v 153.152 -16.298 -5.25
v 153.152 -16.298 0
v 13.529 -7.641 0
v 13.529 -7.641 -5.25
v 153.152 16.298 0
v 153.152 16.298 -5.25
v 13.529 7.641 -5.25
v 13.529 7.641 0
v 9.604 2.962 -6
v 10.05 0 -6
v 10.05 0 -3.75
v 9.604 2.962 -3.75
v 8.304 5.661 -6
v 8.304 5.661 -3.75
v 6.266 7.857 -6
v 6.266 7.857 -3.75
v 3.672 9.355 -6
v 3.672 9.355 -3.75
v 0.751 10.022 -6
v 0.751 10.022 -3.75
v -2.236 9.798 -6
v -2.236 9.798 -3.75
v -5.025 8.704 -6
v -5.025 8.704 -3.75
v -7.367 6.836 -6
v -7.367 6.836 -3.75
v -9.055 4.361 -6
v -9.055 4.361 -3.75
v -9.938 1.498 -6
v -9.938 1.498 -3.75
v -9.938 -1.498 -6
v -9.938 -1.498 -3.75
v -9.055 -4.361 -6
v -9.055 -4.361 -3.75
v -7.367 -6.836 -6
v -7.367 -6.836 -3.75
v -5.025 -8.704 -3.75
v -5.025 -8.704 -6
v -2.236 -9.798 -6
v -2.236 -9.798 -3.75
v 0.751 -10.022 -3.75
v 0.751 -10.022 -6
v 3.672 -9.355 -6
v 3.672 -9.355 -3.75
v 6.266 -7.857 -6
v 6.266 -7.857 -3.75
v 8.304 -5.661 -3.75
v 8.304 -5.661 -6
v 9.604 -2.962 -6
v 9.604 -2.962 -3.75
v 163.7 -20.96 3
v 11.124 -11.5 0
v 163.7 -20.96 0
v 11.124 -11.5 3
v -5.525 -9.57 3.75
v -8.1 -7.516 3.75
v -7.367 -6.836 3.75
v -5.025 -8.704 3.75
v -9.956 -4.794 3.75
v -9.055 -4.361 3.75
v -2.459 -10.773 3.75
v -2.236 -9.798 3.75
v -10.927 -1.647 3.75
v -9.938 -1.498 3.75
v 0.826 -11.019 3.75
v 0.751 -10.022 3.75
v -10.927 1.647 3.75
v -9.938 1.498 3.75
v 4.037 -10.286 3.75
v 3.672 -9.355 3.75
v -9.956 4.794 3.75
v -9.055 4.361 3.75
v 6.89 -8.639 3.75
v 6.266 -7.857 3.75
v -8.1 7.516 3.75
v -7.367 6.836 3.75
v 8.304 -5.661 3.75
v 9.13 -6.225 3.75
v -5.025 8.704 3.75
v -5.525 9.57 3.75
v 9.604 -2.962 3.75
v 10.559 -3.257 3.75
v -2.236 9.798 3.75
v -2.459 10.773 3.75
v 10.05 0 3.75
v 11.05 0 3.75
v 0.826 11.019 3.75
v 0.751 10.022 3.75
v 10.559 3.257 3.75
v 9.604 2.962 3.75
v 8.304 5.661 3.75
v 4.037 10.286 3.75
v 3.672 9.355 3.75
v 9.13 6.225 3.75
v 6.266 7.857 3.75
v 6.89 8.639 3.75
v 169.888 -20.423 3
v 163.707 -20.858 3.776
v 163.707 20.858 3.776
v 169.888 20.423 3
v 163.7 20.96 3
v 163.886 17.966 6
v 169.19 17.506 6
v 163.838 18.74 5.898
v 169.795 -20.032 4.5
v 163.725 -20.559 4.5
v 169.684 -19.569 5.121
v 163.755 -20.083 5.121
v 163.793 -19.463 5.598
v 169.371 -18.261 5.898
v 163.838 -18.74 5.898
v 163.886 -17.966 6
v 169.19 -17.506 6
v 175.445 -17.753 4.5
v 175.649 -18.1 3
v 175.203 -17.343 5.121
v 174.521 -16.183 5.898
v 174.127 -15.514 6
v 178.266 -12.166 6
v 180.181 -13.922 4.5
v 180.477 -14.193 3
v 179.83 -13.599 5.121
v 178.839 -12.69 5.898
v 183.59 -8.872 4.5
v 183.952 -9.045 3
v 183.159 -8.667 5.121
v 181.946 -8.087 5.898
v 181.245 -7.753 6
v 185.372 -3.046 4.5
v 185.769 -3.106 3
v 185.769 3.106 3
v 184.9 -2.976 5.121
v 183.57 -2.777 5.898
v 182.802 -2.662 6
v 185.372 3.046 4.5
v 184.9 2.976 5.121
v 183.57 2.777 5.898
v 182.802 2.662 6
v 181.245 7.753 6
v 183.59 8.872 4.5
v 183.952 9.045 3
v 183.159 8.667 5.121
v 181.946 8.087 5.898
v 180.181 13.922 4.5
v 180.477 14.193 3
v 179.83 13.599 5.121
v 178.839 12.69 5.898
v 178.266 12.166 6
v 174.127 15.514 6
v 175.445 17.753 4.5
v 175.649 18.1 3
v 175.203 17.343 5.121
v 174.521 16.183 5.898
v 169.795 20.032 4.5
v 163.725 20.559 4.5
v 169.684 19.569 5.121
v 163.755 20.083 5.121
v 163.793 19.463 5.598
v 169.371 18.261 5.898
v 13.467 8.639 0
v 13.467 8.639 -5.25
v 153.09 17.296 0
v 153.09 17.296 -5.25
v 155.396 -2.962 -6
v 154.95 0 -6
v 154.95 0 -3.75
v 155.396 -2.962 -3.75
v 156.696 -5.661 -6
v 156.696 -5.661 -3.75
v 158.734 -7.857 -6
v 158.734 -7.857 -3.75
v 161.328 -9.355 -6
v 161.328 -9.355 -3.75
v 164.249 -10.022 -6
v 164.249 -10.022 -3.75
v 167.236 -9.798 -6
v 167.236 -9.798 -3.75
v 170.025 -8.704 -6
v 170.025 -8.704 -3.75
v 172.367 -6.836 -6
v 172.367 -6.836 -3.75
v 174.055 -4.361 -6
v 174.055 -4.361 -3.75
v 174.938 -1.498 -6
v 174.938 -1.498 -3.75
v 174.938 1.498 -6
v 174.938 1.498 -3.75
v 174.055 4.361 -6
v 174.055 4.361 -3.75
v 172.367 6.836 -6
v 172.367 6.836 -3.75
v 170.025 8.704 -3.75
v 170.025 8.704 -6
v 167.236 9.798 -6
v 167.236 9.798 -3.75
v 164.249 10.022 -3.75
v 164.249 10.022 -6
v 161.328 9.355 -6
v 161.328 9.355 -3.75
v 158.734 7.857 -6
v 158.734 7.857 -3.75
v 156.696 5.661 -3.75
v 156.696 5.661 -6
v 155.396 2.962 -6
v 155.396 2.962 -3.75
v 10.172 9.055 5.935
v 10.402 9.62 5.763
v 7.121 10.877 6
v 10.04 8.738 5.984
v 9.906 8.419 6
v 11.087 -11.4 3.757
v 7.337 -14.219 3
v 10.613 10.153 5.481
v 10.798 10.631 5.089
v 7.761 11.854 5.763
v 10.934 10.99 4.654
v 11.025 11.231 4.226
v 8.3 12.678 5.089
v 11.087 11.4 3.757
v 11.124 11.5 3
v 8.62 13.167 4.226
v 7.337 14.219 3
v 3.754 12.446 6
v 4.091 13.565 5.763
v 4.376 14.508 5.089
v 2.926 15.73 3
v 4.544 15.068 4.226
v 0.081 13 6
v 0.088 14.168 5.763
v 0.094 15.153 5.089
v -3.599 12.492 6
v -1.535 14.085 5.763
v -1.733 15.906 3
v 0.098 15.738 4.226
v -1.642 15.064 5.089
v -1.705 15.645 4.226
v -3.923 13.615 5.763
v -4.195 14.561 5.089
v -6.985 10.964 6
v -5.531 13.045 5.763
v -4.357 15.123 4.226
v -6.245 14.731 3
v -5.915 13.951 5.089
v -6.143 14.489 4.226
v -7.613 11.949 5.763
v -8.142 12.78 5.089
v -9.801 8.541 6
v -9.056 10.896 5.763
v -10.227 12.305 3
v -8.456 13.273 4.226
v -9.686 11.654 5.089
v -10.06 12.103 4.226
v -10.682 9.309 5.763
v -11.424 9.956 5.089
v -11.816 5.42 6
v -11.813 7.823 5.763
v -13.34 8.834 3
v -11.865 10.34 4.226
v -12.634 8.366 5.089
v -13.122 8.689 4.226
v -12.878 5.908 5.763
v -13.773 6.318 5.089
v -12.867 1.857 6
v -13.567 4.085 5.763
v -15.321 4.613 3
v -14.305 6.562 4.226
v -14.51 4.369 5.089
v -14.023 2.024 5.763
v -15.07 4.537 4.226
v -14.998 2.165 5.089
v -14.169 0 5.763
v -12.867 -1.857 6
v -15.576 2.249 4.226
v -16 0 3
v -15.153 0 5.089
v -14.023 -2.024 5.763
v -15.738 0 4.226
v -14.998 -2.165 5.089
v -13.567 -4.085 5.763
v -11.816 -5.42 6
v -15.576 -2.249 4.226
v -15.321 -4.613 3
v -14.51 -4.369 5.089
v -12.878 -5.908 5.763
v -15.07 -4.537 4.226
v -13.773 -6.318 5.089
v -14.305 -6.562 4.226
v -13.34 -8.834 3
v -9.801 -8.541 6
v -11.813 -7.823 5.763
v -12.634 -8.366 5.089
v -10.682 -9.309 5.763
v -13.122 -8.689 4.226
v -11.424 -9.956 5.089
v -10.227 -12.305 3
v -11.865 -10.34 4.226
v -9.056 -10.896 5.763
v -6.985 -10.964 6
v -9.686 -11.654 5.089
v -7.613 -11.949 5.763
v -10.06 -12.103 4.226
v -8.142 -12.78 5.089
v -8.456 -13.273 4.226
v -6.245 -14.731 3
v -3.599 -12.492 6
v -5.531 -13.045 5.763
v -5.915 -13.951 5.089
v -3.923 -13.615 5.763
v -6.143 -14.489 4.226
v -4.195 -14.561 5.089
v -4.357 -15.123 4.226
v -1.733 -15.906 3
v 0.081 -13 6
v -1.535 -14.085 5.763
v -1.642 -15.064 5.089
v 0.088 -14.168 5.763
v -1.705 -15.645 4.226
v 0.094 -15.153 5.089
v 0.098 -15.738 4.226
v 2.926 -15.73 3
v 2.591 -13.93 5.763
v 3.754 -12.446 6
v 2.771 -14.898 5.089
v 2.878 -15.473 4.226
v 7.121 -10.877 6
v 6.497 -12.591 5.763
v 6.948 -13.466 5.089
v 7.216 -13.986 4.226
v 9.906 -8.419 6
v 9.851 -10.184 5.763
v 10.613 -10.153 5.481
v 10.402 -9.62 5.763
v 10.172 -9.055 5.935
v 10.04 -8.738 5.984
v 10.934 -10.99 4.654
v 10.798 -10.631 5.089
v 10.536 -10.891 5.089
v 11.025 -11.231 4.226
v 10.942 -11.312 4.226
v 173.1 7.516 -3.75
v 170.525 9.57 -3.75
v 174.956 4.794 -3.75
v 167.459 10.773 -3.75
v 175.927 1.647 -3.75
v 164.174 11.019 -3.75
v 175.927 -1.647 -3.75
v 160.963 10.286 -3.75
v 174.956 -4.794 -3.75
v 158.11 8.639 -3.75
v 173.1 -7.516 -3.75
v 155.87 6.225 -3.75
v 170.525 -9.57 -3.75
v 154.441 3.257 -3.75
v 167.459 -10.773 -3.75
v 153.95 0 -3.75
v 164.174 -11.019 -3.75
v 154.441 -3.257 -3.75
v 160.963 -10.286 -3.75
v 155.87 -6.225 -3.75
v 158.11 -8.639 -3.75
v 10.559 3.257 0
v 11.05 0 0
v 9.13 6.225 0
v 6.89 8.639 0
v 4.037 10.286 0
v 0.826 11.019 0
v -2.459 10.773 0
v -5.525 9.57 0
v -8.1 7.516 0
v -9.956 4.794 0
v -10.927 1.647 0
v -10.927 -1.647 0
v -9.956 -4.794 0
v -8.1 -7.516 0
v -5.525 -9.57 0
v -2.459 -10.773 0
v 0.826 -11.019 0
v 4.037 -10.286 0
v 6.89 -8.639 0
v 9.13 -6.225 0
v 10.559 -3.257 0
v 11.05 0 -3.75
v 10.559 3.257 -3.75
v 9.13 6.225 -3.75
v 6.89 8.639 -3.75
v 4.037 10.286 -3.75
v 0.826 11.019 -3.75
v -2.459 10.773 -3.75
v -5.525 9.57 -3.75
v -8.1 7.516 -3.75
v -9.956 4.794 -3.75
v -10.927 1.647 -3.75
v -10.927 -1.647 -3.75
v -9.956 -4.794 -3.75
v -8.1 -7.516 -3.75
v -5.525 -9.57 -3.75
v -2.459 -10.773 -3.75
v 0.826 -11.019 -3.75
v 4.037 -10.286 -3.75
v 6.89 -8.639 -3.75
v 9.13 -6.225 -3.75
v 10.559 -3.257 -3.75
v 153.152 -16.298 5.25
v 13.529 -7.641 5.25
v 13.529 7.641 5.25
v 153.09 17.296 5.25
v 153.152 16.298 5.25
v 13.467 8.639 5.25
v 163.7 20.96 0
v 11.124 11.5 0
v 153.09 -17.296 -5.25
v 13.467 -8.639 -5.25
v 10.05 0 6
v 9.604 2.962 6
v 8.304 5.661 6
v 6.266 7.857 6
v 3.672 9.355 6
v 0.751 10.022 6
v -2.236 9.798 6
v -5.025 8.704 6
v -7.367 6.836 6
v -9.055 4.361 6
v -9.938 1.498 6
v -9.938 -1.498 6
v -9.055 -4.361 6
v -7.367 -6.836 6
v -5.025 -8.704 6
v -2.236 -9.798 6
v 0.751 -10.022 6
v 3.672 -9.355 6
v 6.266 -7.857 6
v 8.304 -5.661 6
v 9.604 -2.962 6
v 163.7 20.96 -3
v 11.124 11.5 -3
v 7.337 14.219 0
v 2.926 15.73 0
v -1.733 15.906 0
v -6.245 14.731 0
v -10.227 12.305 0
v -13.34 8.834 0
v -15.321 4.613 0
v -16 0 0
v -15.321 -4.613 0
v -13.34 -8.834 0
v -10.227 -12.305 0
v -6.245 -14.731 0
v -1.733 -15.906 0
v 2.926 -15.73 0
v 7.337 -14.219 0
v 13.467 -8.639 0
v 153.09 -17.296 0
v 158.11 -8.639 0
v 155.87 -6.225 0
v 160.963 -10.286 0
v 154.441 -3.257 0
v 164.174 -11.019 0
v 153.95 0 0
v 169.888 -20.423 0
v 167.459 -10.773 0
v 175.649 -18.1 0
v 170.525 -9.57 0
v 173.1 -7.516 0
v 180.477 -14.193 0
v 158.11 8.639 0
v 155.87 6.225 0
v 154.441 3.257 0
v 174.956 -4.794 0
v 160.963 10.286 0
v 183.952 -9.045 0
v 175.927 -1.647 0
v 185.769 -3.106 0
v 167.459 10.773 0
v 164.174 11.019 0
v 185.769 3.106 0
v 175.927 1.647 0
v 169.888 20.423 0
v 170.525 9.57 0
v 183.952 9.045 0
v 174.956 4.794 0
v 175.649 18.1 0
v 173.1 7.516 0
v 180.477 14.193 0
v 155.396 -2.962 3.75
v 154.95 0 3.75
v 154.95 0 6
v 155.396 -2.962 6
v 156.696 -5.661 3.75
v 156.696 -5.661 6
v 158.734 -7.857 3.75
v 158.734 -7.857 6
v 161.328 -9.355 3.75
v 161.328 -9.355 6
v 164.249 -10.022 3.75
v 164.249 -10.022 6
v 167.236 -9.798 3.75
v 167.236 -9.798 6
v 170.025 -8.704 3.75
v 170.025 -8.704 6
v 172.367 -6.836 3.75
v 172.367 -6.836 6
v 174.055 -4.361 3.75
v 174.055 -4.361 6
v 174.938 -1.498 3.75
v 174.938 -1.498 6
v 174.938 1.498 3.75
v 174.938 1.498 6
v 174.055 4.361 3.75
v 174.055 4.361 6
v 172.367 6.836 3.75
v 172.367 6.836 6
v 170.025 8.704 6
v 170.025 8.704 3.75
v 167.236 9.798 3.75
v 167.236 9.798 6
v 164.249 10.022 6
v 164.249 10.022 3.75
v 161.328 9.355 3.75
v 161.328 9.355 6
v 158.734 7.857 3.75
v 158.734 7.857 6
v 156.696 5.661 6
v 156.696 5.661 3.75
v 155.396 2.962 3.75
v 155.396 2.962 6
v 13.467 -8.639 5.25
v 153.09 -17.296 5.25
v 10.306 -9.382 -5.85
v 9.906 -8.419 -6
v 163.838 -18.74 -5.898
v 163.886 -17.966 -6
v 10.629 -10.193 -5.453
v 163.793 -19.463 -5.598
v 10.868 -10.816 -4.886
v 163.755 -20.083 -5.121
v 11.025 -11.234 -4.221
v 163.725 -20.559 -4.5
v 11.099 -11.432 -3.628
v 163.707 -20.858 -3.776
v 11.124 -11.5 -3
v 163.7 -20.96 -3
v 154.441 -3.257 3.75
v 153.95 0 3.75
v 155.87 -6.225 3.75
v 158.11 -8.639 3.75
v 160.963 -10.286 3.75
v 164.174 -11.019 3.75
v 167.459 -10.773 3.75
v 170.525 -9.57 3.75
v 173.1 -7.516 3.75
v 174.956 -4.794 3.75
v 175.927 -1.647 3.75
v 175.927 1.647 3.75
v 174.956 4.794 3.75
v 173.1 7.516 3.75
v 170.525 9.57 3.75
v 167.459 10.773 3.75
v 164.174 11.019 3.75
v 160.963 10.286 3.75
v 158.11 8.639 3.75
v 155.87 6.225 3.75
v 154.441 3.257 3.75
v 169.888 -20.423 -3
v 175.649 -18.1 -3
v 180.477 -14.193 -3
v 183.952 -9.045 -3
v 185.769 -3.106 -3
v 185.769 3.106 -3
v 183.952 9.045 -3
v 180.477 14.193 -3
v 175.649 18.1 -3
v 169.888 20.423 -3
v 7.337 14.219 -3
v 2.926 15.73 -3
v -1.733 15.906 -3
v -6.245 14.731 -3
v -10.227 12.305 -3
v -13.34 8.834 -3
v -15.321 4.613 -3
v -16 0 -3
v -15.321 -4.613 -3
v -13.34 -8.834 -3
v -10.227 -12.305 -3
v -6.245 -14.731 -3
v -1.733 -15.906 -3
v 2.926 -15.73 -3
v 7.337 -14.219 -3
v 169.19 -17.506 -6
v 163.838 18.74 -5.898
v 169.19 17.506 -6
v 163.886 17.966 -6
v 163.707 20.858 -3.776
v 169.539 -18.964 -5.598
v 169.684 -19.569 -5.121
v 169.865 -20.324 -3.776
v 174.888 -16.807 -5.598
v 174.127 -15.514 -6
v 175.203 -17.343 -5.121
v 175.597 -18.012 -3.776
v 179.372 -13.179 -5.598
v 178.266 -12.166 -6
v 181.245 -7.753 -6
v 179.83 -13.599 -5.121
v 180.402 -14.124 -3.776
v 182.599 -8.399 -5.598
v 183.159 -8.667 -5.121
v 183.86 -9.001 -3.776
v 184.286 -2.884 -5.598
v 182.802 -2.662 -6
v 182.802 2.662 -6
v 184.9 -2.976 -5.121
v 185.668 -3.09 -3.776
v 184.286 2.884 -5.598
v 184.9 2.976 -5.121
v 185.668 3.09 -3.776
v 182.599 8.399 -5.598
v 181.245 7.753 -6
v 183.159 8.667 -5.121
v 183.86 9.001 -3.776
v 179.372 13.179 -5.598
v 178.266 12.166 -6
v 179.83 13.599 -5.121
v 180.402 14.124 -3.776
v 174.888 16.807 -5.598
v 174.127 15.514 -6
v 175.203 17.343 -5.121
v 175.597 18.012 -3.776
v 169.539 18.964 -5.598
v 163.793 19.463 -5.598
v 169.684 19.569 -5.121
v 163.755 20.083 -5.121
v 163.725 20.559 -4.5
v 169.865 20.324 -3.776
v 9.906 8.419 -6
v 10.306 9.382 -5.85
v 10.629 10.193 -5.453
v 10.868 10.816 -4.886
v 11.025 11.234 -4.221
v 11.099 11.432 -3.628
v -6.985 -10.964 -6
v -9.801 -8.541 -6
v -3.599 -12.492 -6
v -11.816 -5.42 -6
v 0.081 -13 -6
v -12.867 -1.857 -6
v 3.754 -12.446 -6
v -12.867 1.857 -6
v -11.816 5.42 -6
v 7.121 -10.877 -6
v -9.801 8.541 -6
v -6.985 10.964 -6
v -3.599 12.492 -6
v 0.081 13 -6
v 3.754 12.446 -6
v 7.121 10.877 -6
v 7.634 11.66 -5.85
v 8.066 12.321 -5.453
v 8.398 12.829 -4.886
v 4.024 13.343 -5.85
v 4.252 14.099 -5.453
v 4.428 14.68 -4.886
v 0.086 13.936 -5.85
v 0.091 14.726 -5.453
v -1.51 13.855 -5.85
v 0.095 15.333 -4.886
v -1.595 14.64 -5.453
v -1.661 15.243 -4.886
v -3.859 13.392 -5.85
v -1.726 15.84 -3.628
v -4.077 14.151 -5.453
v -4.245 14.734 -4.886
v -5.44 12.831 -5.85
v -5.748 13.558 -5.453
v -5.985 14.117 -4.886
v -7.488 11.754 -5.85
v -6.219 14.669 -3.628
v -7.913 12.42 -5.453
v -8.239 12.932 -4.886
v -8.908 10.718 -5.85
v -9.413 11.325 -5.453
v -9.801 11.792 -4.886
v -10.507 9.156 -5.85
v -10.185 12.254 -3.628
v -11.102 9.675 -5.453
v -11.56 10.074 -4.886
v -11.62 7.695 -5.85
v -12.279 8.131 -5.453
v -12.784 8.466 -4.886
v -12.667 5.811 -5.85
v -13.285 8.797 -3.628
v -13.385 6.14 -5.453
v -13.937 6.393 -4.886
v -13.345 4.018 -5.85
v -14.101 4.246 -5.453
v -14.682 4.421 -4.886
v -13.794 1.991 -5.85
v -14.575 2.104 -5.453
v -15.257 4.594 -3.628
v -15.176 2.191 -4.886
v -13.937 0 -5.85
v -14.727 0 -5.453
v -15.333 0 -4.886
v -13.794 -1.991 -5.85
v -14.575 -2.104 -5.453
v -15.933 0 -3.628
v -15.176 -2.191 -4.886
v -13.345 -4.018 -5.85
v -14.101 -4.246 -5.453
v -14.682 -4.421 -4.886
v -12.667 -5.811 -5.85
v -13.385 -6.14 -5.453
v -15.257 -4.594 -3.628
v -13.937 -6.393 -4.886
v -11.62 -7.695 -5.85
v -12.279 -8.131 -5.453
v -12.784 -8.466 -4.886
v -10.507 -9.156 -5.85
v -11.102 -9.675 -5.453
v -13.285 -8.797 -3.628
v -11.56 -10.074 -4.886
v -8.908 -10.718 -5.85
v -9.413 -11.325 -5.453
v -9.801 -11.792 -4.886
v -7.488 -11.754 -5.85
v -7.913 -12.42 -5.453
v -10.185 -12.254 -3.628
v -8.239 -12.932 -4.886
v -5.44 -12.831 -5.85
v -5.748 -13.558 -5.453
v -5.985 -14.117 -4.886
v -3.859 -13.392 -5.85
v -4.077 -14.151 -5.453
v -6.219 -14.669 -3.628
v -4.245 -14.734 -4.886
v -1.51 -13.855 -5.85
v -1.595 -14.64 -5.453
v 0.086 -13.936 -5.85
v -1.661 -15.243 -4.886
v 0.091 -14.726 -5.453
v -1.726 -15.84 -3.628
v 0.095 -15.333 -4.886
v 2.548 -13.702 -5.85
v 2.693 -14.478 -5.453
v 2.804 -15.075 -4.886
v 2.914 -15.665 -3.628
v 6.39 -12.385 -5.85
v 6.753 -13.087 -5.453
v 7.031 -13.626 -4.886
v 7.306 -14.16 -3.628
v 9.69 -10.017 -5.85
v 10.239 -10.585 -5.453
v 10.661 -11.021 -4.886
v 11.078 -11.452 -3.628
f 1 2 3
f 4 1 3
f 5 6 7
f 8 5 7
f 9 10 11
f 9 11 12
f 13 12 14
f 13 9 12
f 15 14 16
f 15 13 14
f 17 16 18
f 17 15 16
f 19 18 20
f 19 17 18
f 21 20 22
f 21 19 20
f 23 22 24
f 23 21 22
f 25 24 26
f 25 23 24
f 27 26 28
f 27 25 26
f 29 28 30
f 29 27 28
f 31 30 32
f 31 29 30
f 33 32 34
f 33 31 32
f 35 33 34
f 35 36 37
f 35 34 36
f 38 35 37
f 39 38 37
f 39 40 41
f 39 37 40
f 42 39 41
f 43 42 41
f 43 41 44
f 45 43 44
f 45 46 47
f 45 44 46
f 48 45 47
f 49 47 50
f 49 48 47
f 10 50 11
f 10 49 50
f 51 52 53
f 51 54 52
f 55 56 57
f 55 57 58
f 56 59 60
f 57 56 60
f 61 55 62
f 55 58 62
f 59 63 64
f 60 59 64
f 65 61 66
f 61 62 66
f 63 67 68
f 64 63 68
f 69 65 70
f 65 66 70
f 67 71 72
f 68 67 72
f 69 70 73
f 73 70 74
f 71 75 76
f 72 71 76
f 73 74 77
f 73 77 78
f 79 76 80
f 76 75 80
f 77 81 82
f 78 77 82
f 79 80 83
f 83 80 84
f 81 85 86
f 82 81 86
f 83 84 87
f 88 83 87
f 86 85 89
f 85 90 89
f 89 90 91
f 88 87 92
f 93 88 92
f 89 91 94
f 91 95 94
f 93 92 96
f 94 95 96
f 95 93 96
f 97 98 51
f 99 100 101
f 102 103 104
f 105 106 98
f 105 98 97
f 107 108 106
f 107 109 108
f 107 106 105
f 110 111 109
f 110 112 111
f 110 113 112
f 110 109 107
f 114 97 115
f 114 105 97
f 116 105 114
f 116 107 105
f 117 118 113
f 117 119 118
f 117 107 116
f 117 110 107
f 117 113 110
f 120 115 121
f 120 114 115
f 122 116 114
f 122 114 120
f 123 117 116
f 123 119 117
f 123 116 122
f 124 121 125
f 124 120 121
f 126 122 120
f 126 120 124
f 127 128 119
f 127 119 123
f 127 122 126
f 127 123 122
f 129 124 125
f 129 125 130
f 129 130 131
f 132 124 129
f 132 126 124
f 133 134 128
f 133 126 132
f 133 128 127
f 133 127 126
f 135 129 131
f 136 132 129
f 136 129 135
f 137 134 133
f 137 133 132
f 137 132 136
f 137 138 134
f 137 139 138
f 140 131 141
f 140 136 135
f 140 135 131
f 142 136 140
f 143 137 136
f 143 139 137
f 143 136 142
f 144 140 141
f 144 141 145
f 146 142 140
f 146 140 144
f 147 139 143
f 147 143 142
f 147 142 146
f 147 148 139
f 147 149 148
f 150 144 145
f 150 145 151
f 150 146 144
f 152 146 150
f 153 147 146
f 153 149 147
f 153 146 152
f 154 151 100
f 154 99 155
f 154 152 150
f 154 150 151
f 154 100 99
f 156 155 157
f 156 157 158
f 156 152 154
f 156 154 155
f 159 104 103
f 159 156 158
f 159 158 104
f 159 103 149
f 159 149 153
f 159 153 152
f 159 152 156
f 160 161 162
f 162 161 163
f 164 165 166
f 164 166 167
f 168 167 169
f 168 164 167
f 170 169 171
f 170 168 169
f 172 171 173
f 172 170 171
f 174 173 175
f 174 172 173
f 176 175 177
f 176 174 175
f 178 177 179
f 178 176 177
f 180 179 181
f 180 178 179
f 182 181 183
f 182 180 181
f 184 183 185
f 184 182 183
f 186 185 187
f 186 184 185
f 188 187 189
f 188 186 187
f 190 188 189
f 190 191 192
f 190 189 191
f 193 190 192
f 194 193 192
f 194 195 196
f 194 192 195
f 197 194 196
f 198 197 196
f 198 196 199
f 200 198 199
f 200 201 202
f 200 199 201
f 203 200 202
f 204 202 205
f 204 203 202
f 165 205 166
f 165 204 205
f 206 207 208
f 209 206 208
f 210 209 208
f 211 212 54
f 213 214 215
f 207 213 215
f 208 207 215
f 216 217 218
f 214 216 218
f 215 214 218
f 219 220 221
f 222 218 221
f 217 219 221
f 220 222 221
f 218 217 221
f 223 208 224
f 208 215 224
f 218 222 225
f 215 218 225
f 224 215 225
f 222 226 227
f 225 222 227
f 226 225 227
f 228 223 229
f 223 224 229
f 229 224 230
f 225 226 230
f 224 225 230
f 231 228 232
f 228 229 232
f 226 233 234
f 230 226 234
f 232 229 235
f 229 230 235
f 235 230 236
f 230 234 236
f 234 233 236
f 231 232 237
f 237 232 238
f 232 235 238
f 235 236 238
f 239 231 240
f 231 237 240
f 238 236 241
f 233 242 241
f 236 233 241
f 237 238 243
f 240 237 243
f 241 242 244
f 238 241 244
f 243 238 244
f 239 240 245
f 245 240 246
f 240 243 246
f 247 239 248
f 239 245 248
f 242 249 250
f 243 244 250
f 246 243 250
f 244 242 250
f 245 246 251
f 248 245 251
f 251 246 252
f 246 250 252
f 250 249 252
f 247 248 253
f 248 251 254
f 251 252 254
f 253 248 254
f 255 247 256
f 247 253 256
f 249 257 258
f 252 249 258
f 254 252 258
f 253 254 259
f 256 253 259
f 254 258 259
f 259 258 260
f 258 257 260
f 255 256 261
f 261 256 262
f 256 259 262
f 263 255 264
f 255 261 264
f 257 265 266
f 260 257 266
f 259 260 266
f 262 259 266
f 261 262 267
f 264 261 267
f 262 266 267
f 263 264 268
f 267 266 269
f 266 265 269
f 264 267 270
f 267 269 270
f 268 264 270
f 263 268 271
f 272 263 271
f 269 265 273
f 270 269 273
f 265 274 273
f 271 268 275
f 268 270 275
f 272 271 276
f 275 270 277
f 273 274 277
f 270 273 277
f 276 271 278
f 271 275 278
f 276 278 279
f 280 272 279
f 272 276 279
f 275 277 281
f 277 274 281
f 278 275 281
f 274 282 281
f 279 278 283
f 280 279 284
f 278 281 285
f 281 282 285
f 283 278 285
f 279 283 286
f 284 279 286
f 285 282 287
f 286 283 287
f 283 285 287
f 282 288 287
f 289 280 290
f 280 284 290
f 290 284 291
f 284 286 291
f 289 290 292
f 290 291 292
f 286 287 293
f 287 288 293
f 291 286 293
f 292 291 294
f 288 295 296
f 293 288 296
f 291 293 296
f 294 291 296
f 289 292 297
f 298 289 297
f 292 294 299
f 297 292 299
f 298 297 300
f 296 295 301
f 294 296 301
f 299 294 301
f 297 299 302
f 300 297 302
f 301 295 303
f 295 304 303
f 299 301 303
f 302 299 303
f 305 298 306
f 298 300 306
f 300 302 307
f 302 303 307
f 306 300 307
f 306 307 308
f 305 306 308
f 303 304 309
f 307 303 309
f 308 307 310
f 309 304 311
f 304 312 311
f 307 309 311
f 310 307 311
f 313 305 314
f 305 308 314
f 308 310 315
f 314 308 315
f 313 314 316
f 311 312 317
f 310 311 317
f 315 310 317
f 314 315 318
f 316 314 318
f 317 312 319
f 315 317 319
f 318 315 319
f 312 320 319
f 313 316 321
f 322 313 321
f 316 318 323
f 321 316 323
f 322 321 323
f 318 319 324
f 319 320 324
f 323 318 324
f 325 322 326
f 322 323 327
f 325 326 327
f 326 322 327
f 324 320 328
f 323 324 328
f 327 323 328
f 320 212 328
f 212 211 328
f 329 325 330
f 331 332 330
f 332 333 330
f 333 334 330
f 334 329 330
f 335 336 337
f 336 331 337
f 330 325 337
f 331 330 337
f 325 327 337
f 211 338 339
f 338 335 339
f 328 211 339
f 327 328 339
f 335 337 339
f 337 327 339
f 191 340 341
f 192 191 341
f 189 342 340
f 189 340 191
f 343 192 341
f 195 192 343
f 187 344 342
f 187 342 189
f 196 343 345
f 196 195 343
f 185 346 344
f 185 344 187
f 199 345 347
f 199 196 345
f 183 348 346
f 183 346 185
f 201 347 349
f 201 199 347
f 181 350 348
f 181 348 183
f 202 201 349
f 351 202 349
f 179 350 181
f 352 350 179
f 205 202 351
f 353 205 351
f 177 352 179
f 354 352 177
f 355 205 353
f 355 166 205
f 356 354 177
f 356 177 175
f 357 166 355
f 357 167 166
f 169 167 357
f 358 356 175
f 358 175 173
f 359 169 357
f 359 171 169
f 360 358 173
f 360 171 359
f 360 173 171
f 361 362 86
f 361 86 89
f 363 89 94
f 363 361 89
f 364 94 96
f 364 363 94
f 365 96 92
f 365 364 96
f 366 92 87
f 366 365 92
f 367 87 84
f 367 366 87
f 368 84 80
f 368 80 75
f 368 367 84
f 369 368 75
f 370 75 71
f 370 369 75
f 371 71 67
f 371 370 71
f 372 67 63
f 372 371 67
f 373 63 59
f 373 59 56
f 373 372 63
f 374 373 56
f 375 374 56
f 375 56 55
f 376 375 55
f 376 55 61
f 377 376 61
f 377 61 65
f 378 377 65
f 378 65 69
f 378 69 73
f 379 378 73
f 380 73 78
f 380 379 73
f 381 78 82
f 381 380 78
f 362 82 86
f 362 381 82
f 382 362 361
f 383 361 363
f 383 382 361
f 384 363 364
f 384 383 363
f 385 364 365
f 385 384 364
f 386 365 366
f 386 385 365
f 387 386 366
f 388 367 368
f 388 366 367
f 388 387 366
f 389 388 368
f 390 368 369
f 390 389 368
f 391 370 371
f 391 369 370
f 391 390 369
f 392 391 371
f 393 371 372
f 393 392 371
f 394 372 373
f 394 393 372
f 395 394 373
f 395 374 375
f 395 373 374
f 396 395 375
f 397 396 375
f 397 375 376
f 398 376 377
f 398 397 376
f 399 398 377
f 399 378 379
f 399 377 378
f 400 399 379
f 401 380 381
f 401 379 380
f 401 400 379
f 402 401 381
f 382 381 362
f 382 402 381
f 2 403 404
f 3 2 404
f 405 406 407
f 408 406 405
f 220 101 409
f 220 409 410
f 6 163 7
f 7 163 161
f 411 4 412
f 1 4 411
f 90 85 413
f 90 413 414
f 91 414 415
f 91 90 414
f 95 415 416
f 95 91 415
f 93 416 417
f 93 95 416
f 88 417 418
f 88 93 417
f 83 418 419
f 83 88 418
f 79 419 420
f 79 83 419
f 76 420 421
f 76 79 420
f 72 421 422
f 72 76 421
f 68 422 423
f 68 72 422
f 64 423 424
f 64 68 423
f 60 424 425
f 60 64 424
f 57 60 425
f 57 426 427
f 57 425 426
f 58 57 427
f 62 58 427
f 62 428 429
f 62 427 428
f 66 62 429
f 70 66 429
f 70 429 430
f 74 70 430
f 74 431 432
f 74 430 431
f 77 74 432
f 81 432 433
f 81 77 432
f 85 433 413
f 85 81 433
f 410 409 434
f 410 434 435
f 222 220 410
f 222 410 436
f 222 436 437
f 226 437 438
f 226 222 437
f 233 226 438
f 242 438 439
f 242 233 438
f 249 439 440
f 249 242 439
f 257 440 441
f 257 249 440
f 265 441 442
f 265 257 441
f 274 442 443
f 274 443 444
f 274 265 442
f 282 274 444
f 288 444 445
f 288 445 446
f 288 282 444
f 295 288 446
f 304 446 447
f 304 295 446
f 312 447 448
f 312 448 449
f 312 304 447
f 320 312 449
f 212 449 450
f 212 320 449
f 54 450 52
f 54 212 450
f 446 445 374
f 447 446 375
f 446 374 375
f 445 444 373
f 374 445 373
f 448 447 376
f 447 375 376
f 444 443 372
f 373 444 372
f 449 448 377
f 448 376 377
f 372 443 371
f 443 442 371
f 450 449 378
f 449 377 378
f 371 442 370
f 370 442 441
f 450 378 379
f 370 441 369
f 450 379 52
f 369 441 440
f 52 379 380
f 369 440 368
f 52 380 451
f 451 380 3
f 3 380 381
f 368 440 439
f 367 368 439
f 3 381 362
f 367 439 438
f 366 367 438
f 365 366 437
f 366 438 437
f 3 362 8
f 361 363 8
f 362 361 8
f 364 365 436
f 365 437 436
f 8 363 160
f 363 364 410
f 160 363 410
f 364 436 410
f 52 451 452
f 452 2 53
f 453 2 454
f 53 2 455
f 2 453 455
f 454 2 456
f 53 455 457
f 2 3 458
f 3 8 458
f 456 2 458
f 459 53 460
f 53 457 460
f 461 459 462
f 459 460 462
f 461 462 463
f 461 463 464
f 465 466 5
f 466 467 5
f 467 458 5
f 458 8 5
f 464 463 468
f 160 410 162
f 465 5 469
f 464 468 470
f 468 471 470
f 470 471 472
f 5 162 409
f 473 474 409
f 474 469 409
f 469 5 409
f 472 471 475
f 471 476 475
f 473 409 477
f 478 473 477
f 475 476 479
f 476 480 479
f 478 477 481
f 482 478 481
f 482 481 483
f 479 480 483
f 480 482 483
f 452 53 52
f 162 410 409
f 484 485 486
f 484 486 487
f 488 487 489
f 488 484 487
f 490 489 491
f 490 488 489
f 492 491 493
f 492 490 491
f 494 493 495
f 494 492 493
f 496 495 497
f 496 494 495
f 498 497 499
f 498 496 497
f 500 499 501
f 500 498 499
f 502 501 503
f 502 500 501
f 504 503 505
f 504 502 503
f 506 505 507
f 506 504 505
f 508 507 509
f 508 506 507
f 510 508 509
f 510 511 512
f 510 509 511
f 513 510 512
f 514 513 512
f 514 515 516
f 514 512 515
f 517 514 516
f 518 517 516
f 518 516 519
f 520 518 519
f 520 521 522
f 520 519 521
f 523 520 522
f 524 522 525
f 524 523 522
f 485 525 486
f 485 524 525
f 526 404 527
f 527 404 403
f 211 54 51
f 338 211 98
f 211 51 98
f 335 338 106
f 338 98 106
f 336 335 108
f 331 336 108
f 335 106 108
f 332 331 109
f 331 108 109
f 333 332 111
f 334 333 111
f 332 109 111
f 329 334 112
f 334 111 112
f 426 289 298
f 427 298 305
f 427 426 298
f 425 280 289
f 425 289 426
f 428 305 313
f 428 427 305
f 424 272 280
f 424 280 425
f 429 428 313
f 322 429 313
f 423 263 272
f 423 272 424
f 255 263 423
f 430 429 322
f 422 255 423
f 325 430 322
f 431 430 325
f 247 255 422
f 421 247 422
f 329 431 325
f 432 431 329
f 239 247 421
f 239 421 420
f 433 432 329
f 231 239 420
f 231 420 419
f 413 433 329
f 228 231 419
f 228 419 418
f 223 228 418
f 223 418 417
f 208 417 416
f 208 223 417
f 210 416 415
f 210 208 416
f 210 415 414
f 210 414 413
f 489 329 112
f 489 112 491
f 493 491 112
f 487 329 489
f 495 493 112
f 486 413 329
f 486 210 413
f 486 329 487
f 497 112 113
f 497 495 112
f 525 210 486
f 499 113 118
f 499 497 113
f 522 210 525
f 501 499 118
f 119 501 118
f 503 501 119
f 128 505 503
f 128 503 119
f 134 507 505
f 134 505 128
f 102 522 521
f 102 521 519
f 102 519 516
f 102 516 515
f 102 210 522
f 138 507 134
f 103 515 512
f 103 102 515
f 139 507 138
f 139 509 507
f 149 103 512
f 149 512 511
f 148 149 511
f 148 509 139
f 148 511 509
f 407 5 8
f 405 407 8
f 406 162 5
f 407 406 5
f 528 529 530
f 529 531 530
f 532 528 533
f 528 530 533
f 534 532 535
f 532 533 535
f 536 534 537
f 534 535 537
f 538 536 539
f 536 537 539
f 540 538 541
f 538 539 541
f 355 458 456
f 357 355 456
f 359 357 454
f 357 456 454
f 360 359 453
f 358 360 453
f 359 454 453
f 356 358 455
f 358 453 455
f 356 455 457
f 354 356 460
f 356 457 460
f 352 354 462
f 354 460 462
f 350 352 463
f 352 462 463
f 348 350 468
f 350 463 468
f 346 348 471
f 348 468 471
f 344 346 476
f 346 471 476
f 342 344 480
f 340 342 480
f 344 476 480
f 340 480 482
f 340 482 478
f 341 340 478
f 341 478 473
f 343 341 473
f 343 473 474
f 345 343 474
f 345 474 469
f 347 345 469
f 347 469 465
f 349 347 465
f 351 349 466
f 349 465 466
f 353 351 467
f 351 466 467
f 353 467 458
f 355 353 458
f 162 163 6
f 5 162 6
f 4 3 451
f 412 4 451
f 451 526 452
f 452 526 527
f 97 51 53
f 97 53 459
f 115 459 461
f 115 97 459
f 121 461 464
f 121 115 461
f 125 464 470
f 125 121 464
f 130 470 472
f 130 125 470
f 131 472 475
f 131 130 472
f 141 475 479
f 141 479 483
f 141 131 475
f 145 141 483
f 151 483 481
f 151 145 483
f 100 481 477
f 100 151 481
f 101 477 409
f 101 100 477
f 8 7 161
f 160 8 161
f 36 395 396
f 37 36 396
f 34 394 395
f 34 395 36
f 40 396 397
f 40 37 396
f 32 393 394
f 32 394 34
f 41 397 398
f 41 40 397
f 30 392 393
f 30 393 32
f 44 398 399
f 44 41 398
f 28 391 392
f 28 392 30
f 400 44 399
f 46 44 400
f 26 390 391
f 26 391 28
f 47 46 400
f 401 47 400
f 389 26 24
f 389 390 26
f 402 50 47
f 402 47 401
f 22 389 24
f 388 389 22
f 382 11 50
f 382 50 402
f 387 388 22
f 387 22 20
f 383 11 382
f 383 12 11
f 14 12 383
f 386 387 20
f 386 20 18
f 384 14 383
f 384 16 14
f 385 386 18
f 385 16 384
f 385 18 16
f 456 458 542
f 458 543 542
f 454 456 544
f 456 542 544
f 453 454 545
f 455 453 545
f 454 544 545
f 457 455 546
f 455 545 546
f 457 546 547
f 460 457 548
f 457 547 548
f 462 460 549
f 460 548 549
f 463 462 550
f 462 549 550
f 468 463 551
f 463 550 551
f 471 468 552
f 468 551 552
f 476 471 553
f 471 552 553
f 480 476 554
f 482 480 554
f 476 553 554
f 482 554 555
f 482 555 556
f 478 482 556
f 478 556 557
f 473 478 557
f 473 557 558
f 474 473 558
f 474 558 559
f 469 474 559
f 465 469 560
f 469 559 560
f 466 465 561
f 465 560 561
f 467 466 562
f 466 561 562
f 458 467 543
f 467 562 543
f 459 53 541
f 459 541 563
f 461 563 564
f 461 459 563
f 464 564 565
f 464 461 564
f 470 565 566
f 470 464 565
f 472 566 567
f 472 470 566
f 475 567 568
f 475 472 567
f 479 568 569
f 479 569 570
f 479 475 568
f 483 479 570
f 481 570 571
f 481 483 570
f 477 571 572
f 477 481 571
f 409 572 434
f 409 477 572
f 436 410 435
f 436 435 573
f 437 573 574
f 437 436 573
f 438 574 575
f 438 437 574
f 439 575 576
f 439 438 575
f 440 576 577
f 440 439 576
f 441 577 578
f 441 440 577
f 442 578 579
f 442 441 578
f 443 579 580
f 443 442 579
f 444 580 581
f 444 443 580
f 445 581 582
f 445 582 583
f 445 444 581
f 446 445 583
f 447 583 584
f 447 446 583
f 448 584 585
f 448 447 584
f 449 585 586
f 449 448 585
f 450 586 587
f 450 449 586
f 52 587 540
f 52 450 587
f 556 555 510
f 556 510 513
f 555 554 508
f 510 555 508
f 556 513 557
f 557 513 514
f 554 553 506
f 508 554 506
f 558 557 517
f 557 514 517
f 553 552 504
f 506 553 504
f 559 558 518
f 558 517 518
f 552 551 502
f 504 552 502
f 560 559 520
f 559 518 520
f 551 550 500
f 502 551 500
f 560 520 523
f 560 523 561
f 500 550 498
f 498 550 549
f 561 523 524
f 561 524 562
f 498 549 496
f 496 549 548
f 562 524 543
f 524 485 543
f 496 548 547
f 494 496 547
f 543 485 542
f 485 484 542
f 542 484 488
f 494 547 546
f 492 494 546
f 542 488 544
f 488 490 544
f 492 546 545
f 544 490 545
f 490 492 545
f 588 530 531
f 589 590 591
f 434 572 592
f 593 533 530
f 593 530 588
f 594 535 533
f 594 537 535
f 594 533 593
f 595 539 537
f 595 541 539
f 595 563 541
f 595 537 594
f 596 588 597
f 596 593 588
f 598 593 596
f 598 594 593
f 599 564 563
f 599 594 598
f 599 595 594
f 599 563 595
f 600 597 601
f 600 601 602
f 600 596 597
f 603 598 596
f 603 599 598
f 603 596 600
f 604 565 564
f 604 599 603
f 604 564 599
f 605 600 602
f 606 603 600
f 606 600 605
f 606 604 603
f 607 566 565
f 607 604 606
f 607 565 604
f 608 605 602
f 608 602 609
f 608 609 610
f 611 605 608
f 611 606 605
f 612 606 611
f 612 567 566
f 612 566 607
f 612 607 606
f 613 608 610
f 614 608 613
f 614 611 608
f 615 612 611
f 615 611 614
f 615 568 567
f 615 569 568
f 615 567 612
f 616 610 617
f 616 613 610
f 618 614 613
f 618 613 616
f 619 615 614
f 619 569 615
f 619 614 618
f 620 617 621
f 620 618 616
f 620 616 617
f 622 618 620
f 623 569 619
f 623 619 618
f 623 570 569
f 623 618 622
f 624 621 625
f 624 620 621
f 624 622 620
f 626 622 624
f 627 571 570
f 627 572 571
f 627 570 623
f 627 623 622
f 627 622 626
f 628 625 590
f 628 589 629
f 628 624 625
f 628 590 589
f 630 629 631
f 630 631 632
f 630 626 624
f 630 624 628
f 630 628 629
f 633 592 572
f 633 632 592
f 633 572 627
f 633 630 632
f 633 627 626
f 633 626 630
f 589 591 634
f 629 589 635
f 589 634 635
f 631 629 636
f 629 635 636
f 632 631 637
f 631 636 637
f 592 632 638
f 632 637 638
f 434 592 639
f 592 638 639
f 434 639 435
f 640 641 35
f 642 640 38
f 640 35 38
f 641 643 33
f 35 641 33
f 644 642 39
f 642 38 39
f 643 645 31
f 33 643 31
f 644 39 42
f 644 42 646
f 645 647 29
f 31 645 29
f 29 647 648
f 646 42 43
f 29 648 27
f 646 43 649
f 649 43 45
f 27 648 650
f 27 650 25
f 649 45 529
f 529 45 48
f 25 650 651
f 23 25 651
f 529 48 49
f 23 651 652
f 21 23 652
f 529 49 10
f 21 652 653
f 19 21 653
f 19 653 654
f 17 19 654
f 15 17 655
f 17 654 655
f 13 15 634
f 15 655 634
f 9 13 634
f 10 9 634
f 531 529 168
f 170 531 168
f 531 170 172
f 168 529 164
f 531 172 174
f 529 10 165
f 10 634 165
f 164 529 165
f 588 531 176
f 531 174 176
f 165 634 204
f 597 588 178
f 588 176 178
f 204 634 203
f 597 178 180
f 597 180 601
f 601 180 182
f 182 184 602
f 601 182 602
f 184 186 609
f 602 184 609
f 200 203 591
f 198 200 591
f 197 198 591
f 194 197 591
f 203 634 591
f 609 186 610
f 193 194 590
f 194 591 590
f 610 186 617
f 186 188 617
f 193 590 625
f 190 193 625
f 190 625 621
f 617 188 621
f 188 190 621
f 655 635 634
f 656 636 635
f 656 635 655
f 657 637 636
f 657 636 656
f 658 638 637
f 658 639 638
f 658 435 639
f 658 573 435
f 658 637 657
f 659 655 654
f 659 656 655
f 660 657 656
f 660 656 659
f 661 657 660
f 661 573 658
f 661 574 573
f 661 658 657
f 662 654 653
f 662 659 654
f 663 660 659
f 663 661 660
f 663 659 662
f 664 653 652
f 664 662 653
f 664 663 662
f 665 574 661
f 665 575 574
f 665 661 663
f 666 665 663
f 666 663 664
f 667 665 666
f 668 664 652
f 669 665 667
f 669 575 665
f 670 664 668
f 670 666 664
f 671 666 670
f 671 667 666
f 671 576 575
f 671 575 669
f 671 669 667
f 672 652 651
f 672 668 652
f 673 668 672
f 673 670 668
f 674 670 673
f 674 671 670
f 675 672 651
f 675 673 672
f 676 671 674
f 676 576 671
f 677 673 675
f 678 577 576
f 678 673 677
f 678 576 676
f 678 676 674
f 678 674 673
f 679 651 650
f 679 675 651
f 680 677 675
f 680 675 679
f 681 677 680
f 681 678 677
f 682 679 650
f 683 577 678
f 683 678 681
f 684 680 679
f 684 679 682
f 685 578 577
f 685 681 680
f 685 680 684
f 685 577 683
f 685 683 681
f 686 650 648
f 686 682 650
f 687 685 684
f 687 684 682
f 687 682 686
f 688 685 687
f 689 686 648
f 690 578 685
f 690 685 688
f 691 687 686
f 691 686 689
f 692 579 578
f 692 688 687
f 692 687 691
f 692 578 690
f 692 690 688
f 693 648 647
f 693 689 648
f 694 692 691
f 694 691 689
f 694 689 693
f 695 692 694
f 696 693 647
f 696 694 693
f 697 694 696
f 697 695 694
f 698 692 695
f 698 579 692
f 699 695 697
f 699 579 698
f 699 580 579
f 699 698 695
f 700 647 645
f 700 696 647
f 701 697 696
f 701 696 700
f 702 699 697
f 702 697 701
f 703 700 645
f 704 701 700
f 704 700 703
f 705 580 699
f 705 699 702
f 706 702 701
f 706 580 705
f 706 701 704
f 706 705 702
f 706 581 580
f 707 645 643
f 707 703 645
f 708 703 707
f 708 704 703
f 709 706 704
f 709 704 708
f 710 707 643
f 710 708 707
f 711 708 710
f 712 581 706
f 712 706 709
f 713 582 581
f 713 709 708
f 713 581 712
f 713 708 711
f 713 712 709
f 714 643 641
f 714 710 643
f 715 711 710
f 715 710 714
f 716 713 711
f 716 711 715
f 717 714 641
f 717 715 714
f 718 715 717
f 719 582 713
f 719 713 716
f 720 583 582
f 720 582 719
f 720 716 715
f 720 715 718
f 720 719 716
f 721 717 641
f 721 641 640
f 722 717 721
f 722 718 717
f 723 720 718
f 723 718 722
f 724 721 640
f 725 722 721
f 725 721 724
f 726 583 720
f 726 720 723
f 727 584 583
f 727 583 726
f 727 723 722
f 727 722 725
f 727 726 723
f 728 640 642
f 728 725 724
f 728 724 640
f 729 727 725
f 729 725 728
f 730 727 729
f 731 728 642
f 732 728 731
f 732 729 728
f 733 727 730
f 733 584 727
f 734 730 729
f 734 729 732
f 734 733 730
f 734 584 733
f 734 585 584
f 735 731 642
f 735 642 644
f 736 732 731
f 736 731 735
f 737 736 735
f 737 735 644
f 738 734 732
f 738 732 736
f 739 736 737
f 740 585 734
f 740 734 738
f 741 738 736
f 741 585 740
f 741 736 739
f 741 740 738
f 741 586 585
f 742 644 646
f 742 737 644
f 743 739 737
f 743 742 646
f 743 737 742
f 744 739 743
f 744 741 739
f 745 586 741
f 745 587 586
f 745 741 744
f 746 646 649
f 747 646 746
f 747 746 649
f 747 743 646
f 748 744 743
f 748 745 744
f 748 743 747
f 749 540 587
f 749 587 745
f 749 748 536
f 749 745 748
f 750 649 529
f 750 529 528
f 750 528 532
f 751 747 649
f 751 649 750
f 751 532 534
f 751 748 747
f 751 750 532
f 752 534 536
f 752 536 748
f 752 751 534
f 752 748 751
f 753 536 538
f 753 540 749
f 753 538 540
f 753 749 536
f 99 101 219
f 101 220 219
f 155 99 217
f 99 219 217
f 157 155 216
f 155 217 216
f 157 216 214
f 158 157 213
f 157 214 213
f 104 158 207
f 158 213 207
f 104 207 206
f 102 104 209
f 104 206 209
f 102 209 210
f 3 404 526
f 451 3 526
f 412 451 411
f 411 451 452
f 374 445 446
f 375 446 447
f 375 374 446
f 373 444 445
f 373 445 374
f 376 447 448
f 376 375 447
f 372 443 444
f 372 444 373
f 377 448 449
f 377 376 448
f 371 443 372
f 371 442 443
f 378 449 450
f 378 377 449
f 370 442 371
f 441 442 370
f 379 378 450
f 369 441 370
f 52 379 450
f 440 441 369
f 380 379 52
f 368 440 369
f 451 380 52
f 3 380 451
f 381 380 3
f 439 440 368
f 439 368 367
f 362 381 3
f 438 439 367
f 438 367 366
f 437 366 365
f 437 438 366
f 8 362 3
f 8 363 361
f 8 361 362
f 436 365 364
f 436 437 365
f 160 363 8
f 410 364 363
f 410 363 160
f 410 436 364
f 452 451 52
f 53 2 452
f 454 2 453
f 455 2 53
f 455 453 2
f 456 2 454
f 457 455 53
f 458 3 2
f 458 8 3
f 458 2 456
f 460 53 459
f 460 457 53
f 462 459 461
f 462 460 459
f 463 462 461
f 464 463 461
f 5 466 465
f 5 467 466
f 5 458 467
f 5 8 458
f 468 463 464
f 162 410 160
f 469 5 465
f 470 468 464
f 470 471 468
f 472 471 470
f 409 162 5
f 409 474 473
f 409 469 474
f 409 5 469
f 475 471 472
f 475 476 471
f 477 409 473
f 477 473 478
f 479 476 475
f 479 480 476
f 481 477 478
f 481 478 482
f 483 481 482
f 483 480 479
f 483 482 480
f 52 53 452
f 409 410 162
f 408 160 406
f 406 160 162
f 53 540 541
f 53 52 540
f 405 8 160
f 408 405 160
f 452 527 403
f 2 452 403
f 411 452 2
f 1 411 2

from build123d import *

# Parameters (mm, degrees)
BOSS_EXTRUDE1_DEPTH     = 6
SKETCH6_30_R            = 11.05
CUT_EXTRUDE1_DEPTH      = 3.75
CUT_EXTRUDE2_DEPTH      = 188.27786842
CUT_EXTRUDE2_DEPTH_BACK = 188.27786842
SKETCH6_31_R            = 10.05
CUT_EXTRUDE4_DEPTH      = 5.25
FILLET1_R               = 3


with BuildPart() as part:
    # Sketch6 → Boss-Extrude1 (new, symmetric)
    with BuildSketch(Plane.XY):
        with BuildLine():
            Line((11.124297731, -11.5), (163.700491182, -20.95975374))
            ThreePointArc((163.700491182, -20.95975374), (186, 0), (163.700491182, 20.95975374))
            Line((163.700491182, 20.95975374), (11.124297731, 11.5))
            ThreePointArc((11.124297731, 11.5), (-16, 0), (11.124297731, -11.5))
        make_face()
    extrude(amount=BOSS_EXTRUDE1_DEPTH, both=True)

    # Sketch6<30> → Cut-Extrude1 (cut, symmetric)
    with BuildSketch(Plane.XY):
        Circle(SKETCH6_30_R)
        with Locations((165, 0)):
            Circle(SKETCH6_30_R)
    extrude(amount=CUT_EXTRUDE1_DEPTH, both=True, mode=Mode.SUBTRACT)

    # Sketch6<31> → Cut-Extrude2 (cut, two sides: drawn at the far end of the back side and taken through both)
    with BuildSketch(Plane.XY.offset(-CUT_EXTRUDE2_DEPTH_BACK)):
        Circle(SKETCH6_31_R)
        with Locations((165, 0)):
            Circle(SKETCH6_31_R)
    extrude(amount=CUT_EXTRUDE2_DEPTH + CUT_EXTRUDE2_DEPTH_BACK, mode=Mode.SUBTRACT)

    # Sketch6<34> → Cut-Extrude4 (cut, symmetric)
    with BuildSketch(Plane.XY):
        Polygon((13.466970251, 8.639485647), (153.090211466, 17.296153823), (153.152092838, 16.298070312), (13.528851624, 7.641402136), align=None)
        Polygon((153.090211466, -17.296153823), (153.152092838, -16.298070312), (13.528851624, -7.641402136), (13.466970251, -8.639485647), align=None)
    extrude(amount=CUT_EXTRUDE4_DEPTH, both=True, mode=Mode.SUBTRACT)

    # Fillet1
    fillet1_edges = [part.edges().sort_by_distance(p)[0] for p in [
        (186, 0, 6),
        (186, 0, -6),
        (87.412394456, -16.22987687, 6),
        (-16, 0, 6),
        (87.412394456, 16.22987687, 6),
        (-16, 0, -6),
        (87.412394456, -16.22987687, -6),
        (87.412394456, 16.22987687, -6),
    ]]
    fillet(fillet1_edges, radius=FILLET1_R)


with BuildPart() as body_2:
    # Split1: the piece on the far side of the plane
    add(part.part)
    split(bisect_by=Plane.XY, keep=Keep.BOTTOM)


with BuildPart() as part_1:
    add(part.part)

    # Split1
    split(bisect_by=Plane.XY, keep=Keep.TOP)


solid = Compound([body_2.part, part_1.part])
